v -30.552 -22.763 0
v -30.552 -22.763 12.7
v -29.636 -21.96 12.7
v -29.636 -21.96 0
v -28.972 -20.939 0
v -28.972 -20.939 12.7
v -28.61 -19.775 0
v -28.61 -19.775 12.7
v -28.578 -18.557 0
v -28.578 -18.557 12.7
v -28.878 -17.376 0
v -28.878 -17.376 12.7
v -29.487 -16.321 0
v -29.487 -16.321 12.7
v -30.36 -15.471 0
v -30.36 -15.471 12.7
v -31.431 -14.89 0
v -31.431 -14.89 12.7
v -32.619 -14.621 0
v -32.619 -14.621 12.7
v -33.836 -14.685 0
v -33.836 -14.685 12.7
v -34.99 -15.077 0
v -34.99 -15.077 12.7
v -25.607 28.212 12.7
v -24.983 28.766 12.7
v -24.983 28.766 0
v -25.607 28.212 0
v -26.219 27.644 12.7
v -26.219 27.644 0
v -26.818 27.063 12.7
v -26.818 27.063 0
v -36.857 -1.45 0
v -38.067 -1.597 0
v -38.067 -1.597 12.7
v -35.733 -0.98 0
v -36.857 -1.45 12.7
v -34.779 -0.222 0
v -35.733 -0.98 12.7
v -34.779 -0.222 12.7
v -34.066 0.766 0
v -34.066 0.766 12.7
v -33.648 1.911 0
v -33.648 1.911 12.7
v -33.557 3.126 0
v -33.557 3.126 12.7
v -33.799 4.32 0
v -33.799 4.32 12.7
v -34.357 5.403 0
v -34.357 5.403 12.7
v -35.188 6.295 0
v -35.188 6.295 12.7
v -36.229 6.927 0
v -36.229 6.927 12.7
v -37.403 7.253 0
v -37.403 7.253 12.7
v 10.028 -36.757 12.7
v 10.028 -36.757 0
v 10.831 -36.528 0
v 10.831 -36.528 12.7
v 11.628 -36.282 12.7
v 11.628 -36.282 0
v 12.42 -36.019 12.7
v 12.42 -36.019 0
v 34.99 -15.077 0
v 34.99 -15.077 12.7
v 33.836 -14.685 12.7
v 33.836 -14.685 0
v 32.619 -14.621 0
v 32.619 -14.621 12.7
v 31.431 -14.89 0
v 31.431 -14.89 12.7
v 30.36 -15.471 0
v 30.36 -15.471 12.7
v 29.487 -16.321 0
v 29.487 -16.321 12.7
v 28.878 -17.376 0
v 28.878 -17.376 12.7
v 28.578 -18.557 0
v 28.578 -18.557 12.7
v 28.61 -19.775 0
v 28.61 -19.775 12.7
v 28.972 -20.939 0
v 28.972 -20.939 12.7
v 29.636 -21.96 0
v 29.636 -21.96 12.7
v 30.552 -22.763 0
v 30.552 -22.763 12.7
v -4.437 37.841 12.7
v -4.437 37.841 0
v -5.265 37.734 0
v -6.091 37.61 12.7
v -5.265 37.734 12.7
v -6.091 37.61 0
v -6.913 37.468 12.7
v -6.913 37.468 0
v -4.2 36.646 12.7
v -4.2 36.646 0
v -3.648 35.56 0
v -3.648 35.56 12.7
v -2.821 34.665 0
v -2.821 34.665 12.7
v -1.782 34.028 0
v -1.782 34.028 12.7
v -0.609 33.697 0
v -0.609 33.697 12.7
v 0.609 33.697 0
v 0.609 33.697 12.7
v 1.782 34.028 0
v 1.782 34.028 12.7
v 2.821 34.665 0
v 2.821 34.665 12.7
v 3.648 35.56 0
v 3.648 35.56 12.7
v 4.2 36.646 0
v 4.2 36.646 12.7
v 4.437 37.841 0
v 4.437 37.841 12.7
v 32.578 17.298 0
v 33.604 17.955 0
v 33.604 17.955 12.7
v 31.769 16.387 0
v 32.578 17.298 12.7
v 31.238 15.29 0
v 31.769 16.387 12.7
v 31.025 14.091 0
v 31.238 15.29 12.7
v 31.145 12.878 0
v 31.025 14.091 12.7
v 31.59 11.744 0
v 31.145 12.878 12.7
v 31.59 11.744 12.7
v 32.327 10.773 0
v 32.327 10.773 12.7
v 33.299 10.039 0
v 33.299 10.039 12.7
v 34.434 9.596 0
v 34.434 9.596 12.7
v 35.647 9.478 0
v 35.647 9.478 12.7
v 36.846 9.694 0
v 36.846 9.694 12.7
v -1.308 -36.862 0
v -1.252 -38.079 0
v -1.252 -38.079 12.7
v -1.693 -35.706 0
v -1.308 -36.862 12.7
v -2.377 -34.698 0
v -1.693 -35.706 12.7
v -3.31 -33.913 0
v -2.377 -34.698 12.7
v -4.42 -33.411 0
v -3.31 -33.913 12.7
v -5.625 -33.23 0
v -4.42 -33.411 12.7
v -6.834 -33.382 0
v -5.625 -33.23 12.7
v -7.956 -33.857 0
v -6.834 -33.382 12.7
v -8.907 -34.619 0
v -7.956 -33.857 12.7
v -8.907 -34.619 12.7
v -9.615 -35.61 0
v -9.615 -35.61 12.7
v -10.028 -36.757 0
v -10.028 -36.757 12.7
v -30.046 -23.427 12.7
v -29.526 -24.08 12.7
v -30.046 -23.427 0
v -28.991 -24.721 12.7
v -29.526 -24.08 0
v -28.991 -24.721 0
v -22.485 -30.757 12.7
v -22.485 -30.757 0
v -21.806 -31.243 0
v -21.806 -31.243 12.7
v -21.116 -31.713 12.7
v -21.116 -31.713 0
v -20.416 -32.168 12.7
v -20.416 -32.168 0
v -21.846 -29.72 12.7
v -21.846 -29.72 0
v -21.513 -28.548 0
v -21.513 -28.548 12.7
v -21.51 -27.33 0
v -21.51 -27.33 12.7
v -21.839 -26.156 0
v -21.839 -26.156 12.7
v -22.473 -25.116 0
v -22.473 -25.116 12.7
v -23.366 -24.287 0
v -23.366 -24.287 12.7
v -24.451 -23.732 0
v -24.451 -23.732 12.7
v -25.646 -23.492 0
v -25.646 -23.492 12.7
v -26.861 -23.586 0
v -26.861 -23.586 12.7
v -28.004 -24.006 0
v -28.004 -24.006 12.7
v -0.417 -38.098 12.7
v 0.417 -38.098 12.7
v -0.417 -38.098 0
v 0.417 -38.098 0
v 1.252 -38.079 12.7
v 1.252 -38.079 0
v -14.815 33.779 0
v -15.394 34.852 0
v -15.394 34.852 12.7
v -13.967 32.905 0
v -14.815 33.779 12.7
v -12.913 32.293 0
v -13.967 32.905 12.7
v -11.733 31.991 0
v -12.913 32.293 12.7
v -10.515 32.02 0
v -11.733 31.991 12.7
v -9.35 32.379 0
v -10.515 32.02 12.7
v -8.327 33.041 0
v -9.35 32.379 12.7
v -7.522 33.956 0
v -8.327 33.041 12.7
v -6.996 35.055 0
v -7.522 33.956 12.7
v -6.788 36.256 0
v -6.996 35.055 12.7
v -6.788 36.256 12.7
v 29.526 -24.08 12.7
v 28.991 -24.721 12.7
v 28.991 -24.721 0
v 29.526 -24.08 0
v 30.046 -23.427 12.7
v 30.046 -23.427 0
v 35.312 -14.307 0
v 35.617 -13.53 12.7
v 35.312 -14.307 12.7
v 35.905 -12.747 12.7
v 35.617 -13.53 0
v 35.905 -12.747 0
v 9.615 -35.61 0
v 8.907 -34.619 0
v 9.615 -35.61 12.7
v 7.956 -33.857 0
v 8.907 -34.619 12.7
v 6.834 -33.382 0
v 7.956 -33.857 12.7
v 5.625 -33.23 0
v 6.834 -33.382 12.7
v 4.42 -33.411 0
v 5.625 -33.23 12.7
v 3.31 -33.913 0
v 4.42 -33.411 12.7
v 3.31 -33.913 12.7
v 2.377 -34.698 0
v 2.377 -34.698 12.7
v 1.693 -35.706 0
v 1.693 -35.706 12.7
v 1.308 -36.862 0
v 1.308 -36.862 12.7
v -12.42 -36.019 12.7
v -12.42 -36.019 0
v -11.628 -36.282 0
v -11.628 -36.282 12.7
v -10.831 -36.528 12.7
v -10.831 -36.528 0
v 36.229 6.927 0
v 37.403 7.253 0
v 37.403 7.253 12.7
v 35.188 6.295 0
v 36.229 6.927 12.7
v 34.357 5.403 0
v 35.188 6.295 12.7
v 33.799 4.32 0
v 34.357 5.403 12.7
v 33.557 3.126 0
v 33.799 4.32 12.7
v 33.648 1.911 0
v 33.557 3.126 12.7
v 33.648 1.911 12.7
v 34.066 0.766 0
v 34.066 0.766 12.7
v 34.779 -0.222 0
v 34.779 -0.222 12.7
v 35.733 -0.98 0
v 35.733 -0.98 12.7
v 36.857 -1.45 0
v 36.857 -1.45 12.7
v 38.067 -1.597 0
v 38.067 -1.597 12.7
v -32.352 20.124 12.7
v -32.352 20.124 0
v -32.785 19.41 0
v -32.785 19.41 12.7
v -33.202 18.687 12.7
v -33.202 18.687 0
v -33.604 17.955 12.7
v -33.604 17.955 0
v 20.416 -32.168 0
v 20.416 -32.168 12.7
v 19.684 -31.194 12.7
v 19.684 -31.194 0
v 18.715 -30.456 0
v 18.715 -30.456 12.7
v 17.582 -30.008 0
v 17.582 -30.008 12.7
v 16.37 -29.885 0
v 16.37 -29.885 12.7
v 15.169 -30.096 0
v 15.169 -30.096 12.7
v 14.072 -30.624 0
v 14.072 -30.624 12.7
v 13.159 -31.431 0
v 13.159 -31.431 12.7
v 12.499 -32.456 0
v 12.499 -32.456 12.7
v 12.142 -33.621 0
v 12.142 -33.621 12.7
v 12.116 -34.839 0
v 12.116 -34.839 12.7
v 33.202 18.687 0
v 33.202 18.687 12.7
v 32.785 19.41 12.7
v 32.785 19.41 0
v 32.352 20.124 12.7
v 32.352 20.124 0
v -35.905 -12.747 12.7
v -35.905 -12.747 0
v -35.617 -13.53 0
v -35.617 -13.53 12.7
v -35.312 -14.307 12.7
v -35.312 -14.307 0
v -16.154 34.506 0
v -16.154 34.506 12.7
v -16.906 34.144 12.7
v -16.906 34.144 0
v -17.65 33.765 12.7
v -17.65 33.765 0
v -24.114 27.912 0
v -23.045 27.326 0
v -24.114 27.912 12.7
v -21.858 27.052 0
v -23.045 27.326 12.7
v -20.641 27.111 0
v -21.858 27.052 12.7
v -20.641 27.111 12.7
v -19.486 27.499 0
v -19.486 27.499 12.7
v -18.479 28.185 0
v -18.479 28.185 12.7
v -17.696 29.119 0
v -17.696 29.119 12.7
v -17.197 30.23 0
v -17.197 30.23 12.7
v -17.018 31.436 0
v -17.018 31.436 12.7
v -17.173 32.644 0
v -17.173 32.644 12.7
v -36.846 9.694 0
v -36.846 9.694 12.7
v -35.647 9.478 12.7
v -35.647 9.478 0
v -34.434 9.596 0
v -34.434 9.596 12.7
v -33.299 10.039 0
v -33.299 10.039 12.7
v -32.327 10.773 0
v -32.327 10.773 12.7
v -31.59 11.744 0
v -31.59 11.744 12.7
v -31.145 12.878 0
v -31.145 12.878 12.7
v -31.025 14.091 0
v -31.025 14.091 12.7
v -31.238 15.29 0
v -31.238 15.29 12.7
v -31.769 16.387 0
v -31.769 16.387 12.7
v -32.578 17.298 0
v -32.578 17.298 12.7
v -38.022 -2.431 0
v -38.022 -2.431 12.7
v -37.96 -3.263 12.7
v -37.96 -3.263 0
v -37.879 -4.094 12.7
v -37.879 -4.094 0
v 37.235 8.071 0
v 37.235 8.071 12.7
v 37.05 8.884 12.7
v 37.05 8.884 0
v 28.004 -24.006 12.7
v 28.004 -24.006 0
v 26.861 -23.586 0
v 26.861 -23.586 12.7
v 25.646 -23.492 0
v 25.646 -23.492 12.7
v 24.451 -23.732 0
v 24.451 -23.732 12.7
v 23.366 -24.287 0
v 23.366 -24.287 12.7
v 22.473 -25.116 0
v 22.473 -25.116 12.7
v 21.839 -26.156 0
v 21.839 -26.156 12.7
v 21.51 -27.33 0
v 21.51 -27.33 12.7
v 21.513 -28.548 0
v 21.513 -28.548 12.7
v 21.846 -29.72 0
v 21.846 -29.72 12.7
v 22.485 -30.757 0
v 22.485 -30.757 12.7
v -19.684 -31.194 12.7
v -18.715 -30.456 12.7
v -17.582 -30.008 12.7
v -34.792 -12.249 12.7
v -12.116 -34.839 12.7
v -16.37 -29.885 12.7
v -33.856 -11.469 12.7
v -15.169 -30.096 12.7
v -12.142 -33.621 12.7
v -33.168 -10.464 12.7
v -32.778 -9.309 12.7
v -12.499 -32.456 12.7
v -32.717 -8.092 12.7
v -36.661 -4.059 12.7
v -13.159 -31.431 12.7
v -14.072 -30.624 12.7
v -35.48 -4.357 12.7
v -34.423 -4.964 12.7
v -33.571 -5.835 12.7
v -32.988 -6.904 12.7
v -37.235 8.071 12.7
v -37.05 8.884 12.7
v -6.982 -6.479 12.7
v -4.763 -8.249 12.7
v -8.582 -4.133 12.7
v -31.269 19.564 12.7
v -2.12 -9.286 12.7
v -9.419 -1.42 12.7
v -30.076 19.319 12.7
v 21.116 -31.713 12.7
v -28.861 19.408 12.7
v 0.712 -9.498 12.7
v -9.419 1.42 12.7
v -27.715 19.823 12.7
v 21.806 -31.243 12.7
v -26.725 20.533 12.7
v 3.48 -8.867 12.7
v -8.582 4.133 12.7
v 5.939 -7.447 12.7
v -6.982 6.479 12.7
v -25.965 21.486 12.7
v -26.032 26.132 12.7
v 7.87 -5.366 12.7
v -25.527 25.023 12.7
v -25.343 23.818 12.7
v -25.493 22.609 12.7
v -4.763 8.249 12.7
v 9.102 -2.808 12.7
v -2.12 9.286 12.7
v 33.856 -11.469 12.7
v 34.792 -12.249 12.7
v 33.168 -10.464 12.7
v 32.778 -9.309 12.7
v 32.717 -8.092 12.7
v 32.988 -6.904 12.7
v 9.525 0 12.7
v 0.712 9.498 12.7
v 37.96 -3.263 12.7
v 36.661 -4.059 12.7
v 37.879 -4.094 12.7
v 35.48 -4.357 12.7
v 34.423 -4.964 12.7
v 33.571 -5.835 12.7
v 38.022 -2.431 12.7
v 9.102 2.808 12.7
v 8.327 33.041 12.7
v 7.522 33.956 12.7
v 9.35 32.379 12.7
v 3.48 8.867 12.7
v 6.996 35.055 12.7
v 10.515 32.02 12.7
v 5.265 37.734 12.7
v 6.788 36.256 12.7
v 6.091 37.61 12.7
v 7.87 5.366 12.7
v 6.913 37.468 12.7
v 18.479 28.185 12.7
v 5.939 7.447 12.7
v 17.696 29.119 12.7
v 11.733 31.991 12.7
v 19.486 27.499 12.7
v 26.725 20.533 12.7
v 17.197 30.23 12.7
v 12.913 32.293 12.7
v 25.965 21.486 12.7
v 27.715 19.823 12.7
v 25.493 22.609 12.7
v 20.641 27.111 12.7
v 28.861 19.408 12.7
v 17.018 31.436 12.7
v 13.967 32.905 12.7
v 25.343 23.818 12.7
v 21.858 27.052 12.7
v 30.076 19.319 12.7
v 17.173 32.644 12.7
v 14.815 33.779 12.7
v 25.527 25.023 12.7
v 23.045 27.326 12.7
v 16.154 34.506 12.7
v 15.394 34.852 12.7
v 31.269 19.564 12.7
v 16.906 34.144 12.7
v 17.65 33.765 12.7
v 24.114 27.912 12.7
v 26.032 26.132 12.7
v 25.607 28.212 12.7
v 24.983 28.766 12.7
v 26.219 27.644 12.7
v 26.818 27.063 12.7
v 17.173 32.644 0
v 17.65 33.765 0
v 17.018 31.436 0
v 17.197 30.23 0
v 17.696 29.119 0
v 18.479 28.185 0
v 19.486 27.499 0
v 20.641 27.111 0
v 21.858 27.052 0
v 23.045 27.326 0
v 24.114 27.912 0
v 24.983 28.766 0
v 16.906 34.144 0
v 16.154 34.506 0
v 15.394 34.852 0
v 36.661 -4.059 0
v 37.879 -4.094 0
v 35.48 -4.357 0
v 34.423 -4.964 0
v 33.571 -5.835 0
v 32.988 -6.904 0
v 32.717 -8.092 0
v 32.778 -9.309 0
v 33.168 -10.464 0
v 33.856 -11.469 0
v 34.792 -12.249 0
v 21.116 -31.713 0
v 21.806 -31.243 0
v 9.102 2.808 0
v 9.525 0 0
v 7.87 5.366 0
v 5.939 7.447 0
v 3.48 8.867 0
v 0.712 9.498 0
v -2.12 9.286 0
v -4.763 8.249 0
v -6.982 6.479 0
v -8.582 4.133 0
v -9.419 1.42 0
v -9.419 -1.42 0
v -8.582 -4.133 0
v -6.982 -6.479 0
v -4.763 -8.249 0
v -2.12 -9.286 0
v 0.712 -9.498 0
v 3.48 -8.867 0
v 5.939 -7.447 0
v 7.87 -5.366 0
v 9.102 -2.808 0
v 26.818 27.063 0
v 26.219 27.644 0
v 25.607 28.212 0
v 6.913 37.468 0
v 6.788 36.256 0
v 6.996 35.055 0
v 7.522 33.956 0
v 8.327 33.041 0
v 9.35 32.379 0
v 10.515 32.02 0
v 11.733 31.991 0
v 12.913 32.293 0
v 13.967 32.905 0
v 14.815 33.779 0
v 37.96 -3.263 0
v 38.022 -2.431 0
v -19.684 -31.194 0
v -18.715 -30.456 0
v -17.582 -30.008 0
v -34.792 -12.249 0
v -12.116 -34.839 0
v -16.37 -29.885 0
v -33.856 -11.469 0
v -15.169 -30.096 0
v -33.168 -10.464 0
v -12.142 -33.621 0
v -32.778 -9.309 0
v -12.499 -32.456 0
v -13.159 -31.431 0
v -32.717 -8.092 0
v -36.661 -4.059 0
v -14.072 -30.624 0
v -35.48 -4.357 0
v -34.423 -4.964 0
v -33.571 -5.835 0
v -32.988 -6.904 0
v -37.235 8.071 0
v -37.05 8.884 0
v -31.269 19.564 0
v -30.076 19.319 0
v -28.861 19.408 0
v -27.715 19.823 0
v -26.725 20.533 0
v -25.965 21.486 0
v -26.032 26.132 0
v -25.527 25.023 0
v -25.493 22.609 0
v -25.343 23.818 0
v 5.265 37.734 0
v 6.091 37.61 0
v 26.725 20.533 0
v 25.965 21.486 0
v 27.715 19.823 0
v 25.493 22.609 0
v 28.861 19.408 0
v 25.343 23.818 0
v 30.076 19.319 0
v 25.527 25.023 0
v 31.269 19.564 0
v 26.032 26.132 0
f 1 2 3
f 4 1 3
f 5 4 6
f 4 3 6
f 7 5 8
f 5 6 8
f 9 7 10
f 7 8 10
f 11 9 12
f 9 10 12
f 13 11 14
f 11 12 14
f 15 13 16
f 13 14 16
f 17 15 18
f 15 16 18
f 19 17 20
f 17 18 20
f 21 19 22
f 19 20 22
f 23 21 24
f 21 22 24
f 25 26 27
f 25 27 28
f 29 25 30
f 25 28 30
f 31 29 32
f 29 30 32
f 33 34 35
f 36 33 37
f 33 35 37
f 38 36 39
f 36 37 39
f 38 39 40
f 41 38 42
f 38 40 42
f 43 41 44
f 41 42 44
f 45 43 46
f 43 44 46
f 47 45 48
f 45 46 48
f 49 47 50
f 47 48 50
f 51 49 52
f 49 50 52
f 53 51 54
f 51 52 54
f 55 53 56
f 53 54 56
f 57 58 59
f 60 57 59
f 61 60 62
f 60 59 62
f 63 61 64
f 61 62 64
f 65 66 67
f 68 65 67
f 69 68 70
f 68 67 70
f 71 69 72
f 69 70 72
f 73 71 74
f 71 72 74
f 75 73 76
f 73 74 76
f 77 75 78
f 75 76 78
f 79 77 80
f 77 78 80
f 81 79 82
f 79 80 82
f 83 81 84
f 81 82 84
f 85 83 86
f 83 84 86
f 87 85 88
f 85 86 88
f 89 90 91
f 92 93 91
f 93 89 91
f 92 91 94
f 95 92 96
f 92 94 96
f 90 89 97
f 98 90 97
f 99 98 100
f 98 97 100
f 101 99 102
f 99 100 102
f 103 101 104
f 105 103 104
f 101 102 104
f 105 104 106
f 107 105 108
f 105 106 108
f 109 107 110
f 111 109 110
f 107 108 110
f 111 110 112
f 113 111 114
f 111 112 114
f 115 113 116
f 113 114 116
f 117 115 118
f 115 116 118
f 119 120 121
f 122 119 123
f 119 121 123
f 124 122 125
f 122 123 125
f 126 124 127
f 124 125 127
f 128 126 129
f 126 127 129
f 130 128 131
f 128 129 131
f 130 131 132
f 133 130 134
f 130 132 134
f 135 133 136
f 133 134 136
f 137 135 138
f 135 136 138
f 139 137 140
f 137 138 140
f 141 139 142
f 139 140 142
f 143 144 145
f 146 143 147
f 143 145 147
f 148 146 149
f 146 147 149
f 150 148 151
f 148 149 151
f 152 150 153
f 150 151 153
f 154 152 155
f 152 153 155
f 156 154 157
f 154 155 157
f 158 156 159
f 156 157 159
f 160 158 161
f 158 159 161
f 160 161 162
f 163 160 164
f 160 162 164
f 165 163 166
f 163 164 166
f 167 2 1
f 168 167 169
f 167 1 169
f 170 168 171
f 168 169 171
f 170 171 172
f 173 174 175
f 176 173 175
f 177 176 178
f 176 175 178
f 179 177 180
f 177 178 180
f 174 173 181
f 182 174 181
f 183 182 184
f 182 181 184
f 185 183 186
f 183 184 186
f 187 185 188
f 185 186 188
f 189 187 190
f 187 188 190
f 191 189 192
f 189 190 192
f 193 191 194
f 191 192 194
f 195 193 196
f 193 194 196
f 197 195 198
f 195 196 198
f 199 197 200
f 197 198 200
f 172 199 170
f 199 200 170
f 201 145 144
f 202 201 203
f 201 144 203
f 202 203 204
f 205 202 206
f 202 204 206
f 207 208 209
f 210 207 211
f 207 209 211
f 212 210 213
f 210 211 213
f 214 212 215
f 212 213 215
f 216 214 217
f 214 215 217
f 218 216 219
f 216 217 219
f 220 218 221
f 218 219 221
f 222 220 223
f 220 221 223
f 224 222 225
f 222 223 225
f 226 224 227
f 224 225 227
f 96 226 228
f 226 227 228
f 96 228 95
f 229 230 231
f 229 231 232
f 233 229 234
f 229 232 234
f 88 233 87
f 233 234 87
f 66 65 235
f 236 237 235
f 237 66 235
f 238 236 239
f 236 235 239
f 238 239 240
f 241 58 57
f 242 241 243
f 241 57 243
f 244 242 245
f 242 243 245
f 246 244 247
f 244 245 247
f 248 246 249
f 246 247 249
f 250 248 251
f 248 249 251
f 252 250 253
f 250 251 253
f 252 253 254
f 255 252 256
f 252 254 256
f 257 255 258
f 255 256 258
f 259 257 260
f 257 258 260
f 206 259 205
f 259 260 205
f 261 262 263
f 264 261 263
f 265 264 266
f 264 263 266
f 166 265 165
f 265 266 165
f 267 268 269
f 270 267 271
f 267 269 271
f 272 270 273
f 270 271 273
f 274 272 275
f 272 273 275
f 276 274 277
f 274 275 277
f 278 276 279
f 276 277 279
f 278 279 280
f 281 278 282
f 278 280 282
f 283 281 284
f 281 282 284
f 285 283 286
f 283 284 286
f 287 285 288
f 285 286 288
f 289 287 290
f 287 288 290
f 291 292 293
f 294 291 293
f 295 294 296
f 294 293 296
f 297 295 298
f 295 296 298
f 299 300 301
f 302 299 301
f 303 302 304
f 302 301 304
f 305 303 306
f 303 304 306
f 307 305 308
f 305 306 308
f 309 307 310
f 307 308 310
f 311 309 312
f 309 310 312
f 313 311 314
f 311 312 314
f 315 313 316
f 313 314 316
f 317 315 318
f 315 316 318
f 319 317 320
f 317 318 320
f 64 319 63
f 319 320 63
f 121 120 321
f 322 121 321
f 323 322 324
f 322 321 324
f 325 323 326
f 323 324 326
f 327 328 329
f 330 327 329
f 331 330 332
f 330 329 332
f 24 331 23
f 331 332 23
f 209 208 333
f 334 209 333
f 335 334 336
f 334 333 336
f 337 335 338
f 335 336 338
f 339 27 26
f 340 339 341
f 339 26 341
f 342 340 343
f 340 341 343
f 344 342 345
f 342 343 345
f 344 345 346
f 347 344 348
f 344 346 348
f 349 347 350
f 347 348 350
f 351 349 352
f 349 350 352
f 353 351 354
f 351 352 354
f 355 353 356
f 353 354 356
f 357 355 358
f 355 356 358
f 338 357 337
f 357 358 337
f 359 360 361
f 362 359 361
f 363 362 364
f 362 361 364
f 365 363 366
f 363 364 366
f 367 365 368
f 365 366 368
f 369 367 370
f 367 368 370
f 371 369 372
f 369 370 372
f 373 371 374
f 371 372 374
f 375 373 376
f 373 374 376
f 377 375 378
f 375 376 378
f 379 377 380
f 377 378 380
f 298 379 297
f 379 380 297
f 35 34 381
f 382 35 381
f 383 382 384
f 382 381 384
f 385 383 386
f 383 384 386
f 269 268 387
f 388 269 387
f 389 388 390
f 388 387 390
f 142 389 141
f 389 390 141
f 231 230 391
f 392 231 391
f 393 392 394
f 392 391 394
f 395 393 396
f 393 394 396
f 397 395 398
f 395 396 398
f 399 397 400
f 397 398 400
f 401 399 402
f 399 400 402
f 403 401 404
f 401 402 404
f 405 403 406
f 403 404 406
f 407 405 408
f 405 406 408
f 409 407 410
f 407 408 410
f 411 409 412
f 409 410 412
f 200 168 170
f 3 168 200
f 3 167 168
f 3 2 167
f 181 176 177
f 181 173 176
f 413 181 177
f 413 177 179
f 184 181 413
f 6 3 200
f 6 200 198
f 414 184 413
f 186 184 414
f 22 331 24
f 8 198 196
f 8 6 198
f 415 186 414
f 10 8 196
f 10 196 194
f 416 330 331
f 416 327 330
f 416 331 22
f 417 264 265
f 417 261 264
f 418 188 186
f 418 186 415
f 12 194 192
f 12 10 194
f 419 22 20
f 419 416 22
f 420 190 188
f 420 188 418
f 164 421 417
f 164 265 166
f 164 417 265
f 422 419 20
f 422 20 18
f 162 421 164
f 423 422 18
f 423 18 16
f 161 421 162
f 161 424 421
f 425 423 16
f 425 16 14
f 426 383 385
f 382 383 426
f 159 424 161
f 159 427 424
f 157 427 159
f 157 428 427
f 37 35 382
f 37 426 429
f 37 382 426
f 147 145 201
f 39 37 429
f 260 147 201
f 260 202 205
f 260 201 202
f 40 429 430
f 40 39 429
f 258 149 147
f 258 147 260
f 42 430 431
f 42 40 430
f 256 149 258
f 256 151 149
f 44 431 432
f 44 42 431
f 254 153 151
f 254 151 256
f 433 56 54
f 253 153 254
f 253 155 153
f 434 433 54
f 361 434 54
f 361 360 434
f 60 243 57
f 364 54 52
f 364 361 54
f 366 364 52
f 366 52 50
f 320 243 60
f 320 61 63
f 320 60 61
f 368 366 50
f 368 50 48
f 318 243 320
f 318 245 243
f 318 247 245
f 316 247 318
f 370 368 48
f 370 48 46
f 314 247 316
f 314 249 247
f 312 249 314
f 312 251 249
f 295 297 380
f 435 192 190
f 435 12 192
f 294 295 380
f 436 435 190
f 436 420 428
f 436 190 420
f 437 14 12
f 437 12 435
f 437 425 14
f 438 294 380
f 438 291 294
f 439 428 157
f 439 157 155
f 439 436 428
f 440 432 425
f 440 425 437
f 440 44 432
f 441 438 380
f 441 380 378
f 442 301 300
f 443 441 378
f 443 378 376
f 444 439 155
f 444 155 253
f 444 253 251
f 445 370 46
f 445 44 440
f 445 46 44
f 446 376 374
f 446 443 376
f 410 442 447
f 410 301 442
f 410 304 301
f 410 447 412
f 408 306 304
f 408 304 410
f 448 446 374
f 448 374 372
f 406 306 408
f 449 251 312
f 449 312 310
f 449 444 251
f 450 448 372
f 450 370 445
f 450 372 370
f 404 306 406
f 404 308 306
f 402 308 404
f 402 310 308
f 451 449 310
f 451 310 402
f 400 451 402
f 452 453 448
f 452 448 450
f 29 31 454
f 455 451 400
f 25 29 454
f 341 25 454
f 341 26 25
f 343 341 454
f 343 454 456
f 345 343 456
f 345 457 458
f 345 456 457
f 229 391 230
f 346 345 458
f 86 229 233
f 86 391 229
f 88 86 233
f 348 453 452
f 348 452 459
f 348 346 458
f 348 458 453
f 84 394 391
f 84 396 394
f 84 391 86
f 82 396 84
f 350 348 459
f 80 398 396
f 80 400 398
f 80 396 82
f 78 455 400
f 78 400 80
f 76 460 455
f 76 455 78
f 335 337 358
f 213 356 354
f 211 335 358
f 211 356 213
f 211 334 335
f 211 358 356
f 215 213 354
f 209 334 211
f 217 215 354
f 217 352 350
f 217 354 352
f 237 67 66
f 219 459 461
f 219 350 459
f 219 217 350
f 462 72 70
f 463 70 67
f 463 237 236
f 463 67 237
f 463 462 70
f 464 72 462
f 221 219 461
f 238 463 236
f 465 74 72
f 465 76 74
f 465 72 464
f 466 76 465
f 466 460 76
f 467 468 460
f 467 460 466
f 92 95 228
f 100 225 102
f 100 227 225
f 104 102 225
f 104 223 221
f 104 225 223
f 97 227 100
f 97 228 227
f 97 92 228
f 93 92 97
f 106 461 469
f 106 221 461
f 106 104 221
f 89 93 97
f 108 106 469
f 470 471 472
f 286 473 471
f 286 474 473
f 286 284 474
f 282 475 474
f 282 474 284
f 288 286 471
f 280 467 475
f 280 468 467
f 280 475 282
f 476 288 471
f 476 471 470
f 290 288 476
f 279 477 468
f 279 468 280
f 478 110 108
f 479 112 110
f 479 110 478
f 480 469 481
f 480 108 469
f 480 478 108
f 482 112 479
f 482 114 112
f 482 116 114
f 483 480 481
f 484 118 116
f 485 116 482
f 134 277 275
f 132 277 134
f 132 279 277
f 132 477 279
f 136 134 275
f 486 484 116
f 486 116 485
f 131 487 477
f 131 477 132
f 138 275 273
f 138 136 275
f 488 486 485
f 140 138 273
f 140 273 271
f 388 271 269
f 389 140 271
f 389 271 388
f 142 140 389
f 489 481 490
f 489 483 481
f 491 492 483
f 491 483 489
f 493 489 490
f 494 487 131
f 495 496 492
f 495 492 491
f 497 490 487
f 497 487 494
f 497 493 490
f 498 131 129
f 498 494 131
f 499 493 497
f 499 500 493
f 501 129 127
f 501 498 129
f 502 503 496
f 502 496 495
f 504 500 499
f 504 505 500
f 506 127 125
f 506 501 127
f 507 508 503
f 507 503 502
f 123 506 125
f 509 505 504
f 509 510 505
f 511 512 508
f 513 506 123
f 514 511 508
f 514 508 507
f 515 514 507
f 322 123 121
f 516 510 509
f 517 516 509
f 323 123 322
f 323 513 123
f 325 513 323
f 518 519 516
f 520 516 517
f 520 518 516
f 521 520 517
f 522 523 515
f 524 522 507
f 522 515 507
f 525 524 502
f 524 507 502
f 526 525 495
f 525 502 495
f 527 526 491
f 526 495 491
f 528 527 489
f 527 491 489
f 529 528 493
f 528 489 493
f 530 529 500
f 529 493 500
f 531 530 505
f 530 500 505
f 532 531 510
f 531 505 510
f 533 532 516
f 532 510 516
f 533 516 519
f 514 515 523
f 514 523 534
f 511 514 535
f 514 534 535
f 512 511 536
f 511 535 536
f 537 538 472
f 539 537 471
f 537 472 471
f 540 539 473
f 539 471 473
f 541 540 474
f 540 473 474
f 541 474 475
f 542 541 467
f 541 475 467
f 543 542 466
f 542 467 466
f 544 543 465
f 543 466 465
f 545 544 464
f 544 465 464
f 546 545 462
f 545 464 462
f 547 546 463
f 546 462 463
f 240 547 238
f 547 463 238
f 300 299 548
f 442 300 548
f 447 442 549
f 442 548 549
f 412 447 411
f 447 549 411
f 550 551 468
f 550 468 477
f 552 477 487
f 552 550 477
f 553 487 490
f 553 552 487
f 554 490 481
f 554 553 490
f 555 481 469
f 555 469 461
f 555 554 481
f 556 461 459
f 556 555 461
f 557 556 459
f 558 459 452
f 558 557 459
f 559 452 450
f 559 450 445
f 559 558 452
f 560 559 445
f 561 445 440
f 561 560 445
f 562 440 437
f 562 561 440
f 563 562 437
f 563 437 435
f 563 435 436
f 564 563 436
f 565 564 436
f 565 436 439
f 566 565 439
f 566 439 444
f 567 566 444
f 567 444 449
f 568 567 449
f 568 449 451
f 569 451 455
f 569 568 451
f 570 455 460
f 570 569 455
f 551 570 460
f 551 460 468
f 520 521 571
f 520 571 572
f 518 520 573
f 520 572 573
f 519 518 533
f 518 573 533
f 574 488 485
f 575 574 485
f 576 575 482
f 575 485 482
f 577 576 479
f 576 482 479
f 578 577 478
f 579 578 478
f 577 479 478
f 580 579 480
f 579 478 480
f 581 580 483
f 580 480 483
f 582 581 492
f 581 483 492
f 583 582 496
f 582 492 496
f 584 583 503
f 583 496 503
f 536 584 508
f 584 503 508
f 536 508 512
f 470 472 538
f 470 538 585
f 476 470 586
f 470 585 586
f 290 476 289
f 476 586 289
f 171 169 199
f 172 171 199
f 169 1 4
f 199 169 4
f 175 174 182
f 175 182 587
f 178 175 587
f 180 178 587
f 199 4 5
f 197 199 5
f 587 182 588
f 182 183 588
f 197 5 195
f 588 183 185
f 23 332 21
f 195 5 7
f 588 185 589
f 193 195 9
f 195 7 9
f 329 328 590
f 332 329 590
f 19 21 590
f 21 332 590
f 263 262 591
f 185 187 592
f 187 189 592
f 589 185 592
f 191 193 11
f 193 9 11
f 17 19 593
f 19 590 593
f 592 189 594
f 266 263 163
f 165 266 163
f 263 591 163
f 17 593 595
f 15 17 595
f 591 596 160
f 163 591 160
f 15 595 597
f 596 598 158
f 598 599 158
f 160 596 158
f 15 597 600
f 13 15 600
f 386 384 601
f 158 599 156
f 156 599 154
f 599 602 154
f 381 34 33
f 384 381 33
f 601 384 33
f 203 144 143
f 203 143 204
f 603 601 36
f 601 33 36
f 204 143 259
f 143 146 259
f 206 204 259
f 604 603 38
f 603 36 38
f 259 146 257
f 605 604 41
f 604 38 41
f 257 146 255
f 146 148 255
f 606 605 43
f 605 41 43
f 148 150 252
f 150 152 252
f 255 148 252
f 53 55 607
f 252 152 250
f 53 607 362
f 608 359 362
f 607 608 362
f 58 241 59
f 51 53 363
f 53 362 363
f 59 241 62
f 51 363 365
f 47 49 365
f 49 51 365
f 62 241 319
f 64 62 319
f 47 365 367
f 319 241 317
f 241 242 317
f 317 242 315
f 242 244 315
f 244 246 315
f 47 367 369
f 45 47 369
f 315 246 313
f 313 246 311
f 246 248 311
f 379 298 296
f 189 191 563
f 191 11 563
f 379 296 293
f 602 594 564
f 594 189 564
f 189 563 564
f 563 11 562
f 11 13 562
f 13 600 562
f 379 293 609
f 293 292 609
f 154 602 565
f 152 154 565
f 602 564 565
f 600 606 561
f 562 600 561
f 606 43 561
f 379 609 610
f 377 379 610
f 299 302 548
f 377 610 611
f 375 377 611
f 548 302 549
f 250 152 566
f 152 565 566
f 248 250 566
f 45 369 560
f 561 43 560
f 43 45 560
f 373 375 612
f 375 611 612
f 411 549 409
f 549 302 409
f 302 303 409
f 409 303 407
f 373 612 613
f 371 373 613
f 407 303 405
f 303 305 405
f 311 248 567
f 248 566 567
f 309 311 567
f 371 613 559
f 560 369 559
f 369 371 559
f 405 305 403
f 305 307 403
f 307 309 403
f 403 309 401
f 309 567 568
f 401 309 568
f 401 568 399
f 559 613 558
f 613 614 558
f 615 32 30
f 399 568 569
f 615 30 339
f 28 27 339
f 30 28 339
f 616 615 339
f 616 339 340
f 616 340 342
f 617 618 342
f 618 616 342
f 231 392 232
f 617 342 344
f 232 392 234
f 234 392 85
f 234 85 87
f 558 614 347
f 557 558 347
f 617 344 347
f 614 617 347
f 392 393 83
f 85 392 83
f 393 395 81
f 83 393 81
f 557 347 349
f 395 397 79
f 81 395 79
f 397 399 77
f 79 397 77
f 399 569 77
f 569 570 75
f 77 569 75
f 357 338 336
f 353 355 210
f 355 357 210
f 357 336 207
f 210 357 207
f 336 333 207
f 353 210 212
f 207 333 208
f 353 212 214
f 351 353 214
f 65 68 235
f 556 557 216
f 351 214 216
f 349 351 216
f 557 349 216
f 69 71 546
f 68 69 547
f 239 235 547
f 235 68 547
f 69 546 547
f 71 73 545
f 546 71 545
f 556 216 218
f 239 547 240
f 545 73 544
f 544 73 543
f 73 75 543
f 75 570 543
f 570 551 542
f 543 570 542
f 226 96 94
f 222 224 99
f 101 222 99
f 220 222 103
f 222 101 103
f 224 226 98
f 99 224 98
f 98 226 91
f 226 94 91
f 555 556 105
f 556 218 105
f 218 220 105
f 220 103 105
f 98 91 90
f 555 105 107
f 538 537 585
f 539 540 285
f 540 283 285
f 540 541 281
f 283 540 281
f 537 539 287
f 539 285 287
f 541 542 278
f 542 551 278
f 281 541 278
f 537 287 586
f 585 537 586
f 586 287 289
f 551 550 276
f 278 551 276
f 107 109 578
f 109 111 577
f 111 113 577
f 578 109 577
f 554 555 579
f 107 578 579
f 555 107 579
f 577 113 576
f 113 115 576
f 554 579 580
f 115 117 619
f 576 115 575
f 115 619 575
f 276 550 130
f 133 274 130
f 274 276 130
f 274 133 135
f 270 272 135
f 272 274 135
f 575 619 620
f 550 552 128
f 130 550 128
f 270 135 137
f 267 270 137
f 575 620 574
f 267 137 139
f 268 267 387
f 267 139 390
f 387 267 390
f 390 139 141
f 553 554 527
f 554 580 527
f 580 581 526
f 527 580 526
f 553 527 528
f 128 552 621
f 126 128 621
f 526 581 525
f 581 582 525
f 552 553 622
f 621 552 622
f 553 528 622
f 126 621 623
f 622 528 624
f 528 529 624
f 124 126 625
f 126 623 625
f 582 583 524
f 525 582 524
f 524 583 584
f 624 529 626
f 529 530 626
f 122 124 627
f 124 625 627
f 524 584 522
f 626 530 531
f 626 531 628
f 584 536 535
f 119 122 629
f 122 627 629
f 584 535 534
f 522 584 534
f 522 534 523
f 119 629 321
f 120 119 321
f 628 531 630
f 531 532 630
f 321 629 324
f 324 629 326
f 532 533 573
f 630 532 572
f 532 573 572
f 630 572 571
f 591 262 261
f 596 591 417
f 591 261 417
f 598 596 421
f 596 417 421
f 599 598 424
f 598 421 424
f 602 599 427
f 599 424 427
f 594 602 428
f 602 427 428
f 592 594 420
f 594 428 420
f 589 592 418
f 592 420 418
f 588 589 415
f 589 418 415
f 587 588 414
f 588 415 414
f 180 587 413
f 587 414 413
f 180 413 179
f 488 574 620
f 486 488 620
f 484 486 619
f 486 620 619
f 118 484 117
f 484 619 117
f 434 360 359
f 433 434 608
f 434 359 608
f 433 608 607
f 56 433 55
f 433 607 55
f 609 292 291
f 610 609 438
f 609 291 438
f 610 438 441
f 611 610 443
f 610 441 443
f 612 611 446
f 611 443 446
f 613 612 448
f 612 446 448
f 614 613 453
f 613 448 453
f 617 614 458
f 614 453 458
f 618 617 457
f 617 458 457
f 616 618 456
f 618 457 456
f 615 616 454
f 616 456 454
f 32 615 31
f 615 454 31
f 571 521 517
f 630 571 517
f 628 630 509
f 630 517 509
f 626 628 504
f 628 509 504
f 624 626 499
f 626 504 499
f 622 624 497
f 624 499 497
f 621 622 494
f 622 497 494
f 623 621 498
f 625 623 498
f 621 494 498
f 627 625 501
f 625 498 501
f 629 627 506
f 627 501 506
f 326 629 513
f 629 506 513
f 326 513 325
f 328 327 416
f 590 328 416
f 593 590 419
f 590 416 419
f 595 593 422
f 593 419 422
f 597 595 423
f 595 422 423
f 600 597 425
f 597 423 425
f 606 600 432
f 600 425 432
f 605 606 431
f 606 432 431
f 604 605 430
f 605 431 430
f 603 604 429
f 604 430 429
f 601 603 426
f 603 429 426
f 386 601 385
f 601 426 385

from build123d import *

# Parameters (mm, degrees)
SKETCH1_R           = 38.1
SKETCH1_R_2         = 9.525
BOSS_EXTRUDE1_DEPTH = 12.7
SKETCH2_R           = 4.445
CUT_EXTRUDE1_DEPTH  = 56.358016583
CIRPATTERN1_COUNT   = 21


with BuildPart() as part:
    # Sketch1 → Boss-Extrude1 (new body)
    with BuildSketch(Plane.XY):
        Circle(SKETCH1_R)
        Circle(SKETCH1_R_2, mode=Mode.SUBTRACT)
    extrude(amount=BOSS_EXTRUDE1_DEPTH)

    # Sketch2 → Cut-Extrude1 (cut, through all)
    with BuildSketch(Plane.XY.offset(12.7)):
        with Locations((0, 38.1)):
            Circle(SKETCH2_R)
    cut_extrude1 = extrude(amount=-CUT_EXTRUDE1_DEPTH, mode=Mode.SUBTRACT)

    # CirPattern1: Cut-Extrude1 ×21 about axis
    cirpattern1_axis = Axis((0, 0, 0), (0, 0, 1))
    for i in range(1, CIRPATTERN1_COUNT):
        add(cut_extrude1.rotate(cirpattern1_axis, i * 360 / CIRPATTERN1_COUNT), mode=Mode.SUBTRACT)


solid = part.part
